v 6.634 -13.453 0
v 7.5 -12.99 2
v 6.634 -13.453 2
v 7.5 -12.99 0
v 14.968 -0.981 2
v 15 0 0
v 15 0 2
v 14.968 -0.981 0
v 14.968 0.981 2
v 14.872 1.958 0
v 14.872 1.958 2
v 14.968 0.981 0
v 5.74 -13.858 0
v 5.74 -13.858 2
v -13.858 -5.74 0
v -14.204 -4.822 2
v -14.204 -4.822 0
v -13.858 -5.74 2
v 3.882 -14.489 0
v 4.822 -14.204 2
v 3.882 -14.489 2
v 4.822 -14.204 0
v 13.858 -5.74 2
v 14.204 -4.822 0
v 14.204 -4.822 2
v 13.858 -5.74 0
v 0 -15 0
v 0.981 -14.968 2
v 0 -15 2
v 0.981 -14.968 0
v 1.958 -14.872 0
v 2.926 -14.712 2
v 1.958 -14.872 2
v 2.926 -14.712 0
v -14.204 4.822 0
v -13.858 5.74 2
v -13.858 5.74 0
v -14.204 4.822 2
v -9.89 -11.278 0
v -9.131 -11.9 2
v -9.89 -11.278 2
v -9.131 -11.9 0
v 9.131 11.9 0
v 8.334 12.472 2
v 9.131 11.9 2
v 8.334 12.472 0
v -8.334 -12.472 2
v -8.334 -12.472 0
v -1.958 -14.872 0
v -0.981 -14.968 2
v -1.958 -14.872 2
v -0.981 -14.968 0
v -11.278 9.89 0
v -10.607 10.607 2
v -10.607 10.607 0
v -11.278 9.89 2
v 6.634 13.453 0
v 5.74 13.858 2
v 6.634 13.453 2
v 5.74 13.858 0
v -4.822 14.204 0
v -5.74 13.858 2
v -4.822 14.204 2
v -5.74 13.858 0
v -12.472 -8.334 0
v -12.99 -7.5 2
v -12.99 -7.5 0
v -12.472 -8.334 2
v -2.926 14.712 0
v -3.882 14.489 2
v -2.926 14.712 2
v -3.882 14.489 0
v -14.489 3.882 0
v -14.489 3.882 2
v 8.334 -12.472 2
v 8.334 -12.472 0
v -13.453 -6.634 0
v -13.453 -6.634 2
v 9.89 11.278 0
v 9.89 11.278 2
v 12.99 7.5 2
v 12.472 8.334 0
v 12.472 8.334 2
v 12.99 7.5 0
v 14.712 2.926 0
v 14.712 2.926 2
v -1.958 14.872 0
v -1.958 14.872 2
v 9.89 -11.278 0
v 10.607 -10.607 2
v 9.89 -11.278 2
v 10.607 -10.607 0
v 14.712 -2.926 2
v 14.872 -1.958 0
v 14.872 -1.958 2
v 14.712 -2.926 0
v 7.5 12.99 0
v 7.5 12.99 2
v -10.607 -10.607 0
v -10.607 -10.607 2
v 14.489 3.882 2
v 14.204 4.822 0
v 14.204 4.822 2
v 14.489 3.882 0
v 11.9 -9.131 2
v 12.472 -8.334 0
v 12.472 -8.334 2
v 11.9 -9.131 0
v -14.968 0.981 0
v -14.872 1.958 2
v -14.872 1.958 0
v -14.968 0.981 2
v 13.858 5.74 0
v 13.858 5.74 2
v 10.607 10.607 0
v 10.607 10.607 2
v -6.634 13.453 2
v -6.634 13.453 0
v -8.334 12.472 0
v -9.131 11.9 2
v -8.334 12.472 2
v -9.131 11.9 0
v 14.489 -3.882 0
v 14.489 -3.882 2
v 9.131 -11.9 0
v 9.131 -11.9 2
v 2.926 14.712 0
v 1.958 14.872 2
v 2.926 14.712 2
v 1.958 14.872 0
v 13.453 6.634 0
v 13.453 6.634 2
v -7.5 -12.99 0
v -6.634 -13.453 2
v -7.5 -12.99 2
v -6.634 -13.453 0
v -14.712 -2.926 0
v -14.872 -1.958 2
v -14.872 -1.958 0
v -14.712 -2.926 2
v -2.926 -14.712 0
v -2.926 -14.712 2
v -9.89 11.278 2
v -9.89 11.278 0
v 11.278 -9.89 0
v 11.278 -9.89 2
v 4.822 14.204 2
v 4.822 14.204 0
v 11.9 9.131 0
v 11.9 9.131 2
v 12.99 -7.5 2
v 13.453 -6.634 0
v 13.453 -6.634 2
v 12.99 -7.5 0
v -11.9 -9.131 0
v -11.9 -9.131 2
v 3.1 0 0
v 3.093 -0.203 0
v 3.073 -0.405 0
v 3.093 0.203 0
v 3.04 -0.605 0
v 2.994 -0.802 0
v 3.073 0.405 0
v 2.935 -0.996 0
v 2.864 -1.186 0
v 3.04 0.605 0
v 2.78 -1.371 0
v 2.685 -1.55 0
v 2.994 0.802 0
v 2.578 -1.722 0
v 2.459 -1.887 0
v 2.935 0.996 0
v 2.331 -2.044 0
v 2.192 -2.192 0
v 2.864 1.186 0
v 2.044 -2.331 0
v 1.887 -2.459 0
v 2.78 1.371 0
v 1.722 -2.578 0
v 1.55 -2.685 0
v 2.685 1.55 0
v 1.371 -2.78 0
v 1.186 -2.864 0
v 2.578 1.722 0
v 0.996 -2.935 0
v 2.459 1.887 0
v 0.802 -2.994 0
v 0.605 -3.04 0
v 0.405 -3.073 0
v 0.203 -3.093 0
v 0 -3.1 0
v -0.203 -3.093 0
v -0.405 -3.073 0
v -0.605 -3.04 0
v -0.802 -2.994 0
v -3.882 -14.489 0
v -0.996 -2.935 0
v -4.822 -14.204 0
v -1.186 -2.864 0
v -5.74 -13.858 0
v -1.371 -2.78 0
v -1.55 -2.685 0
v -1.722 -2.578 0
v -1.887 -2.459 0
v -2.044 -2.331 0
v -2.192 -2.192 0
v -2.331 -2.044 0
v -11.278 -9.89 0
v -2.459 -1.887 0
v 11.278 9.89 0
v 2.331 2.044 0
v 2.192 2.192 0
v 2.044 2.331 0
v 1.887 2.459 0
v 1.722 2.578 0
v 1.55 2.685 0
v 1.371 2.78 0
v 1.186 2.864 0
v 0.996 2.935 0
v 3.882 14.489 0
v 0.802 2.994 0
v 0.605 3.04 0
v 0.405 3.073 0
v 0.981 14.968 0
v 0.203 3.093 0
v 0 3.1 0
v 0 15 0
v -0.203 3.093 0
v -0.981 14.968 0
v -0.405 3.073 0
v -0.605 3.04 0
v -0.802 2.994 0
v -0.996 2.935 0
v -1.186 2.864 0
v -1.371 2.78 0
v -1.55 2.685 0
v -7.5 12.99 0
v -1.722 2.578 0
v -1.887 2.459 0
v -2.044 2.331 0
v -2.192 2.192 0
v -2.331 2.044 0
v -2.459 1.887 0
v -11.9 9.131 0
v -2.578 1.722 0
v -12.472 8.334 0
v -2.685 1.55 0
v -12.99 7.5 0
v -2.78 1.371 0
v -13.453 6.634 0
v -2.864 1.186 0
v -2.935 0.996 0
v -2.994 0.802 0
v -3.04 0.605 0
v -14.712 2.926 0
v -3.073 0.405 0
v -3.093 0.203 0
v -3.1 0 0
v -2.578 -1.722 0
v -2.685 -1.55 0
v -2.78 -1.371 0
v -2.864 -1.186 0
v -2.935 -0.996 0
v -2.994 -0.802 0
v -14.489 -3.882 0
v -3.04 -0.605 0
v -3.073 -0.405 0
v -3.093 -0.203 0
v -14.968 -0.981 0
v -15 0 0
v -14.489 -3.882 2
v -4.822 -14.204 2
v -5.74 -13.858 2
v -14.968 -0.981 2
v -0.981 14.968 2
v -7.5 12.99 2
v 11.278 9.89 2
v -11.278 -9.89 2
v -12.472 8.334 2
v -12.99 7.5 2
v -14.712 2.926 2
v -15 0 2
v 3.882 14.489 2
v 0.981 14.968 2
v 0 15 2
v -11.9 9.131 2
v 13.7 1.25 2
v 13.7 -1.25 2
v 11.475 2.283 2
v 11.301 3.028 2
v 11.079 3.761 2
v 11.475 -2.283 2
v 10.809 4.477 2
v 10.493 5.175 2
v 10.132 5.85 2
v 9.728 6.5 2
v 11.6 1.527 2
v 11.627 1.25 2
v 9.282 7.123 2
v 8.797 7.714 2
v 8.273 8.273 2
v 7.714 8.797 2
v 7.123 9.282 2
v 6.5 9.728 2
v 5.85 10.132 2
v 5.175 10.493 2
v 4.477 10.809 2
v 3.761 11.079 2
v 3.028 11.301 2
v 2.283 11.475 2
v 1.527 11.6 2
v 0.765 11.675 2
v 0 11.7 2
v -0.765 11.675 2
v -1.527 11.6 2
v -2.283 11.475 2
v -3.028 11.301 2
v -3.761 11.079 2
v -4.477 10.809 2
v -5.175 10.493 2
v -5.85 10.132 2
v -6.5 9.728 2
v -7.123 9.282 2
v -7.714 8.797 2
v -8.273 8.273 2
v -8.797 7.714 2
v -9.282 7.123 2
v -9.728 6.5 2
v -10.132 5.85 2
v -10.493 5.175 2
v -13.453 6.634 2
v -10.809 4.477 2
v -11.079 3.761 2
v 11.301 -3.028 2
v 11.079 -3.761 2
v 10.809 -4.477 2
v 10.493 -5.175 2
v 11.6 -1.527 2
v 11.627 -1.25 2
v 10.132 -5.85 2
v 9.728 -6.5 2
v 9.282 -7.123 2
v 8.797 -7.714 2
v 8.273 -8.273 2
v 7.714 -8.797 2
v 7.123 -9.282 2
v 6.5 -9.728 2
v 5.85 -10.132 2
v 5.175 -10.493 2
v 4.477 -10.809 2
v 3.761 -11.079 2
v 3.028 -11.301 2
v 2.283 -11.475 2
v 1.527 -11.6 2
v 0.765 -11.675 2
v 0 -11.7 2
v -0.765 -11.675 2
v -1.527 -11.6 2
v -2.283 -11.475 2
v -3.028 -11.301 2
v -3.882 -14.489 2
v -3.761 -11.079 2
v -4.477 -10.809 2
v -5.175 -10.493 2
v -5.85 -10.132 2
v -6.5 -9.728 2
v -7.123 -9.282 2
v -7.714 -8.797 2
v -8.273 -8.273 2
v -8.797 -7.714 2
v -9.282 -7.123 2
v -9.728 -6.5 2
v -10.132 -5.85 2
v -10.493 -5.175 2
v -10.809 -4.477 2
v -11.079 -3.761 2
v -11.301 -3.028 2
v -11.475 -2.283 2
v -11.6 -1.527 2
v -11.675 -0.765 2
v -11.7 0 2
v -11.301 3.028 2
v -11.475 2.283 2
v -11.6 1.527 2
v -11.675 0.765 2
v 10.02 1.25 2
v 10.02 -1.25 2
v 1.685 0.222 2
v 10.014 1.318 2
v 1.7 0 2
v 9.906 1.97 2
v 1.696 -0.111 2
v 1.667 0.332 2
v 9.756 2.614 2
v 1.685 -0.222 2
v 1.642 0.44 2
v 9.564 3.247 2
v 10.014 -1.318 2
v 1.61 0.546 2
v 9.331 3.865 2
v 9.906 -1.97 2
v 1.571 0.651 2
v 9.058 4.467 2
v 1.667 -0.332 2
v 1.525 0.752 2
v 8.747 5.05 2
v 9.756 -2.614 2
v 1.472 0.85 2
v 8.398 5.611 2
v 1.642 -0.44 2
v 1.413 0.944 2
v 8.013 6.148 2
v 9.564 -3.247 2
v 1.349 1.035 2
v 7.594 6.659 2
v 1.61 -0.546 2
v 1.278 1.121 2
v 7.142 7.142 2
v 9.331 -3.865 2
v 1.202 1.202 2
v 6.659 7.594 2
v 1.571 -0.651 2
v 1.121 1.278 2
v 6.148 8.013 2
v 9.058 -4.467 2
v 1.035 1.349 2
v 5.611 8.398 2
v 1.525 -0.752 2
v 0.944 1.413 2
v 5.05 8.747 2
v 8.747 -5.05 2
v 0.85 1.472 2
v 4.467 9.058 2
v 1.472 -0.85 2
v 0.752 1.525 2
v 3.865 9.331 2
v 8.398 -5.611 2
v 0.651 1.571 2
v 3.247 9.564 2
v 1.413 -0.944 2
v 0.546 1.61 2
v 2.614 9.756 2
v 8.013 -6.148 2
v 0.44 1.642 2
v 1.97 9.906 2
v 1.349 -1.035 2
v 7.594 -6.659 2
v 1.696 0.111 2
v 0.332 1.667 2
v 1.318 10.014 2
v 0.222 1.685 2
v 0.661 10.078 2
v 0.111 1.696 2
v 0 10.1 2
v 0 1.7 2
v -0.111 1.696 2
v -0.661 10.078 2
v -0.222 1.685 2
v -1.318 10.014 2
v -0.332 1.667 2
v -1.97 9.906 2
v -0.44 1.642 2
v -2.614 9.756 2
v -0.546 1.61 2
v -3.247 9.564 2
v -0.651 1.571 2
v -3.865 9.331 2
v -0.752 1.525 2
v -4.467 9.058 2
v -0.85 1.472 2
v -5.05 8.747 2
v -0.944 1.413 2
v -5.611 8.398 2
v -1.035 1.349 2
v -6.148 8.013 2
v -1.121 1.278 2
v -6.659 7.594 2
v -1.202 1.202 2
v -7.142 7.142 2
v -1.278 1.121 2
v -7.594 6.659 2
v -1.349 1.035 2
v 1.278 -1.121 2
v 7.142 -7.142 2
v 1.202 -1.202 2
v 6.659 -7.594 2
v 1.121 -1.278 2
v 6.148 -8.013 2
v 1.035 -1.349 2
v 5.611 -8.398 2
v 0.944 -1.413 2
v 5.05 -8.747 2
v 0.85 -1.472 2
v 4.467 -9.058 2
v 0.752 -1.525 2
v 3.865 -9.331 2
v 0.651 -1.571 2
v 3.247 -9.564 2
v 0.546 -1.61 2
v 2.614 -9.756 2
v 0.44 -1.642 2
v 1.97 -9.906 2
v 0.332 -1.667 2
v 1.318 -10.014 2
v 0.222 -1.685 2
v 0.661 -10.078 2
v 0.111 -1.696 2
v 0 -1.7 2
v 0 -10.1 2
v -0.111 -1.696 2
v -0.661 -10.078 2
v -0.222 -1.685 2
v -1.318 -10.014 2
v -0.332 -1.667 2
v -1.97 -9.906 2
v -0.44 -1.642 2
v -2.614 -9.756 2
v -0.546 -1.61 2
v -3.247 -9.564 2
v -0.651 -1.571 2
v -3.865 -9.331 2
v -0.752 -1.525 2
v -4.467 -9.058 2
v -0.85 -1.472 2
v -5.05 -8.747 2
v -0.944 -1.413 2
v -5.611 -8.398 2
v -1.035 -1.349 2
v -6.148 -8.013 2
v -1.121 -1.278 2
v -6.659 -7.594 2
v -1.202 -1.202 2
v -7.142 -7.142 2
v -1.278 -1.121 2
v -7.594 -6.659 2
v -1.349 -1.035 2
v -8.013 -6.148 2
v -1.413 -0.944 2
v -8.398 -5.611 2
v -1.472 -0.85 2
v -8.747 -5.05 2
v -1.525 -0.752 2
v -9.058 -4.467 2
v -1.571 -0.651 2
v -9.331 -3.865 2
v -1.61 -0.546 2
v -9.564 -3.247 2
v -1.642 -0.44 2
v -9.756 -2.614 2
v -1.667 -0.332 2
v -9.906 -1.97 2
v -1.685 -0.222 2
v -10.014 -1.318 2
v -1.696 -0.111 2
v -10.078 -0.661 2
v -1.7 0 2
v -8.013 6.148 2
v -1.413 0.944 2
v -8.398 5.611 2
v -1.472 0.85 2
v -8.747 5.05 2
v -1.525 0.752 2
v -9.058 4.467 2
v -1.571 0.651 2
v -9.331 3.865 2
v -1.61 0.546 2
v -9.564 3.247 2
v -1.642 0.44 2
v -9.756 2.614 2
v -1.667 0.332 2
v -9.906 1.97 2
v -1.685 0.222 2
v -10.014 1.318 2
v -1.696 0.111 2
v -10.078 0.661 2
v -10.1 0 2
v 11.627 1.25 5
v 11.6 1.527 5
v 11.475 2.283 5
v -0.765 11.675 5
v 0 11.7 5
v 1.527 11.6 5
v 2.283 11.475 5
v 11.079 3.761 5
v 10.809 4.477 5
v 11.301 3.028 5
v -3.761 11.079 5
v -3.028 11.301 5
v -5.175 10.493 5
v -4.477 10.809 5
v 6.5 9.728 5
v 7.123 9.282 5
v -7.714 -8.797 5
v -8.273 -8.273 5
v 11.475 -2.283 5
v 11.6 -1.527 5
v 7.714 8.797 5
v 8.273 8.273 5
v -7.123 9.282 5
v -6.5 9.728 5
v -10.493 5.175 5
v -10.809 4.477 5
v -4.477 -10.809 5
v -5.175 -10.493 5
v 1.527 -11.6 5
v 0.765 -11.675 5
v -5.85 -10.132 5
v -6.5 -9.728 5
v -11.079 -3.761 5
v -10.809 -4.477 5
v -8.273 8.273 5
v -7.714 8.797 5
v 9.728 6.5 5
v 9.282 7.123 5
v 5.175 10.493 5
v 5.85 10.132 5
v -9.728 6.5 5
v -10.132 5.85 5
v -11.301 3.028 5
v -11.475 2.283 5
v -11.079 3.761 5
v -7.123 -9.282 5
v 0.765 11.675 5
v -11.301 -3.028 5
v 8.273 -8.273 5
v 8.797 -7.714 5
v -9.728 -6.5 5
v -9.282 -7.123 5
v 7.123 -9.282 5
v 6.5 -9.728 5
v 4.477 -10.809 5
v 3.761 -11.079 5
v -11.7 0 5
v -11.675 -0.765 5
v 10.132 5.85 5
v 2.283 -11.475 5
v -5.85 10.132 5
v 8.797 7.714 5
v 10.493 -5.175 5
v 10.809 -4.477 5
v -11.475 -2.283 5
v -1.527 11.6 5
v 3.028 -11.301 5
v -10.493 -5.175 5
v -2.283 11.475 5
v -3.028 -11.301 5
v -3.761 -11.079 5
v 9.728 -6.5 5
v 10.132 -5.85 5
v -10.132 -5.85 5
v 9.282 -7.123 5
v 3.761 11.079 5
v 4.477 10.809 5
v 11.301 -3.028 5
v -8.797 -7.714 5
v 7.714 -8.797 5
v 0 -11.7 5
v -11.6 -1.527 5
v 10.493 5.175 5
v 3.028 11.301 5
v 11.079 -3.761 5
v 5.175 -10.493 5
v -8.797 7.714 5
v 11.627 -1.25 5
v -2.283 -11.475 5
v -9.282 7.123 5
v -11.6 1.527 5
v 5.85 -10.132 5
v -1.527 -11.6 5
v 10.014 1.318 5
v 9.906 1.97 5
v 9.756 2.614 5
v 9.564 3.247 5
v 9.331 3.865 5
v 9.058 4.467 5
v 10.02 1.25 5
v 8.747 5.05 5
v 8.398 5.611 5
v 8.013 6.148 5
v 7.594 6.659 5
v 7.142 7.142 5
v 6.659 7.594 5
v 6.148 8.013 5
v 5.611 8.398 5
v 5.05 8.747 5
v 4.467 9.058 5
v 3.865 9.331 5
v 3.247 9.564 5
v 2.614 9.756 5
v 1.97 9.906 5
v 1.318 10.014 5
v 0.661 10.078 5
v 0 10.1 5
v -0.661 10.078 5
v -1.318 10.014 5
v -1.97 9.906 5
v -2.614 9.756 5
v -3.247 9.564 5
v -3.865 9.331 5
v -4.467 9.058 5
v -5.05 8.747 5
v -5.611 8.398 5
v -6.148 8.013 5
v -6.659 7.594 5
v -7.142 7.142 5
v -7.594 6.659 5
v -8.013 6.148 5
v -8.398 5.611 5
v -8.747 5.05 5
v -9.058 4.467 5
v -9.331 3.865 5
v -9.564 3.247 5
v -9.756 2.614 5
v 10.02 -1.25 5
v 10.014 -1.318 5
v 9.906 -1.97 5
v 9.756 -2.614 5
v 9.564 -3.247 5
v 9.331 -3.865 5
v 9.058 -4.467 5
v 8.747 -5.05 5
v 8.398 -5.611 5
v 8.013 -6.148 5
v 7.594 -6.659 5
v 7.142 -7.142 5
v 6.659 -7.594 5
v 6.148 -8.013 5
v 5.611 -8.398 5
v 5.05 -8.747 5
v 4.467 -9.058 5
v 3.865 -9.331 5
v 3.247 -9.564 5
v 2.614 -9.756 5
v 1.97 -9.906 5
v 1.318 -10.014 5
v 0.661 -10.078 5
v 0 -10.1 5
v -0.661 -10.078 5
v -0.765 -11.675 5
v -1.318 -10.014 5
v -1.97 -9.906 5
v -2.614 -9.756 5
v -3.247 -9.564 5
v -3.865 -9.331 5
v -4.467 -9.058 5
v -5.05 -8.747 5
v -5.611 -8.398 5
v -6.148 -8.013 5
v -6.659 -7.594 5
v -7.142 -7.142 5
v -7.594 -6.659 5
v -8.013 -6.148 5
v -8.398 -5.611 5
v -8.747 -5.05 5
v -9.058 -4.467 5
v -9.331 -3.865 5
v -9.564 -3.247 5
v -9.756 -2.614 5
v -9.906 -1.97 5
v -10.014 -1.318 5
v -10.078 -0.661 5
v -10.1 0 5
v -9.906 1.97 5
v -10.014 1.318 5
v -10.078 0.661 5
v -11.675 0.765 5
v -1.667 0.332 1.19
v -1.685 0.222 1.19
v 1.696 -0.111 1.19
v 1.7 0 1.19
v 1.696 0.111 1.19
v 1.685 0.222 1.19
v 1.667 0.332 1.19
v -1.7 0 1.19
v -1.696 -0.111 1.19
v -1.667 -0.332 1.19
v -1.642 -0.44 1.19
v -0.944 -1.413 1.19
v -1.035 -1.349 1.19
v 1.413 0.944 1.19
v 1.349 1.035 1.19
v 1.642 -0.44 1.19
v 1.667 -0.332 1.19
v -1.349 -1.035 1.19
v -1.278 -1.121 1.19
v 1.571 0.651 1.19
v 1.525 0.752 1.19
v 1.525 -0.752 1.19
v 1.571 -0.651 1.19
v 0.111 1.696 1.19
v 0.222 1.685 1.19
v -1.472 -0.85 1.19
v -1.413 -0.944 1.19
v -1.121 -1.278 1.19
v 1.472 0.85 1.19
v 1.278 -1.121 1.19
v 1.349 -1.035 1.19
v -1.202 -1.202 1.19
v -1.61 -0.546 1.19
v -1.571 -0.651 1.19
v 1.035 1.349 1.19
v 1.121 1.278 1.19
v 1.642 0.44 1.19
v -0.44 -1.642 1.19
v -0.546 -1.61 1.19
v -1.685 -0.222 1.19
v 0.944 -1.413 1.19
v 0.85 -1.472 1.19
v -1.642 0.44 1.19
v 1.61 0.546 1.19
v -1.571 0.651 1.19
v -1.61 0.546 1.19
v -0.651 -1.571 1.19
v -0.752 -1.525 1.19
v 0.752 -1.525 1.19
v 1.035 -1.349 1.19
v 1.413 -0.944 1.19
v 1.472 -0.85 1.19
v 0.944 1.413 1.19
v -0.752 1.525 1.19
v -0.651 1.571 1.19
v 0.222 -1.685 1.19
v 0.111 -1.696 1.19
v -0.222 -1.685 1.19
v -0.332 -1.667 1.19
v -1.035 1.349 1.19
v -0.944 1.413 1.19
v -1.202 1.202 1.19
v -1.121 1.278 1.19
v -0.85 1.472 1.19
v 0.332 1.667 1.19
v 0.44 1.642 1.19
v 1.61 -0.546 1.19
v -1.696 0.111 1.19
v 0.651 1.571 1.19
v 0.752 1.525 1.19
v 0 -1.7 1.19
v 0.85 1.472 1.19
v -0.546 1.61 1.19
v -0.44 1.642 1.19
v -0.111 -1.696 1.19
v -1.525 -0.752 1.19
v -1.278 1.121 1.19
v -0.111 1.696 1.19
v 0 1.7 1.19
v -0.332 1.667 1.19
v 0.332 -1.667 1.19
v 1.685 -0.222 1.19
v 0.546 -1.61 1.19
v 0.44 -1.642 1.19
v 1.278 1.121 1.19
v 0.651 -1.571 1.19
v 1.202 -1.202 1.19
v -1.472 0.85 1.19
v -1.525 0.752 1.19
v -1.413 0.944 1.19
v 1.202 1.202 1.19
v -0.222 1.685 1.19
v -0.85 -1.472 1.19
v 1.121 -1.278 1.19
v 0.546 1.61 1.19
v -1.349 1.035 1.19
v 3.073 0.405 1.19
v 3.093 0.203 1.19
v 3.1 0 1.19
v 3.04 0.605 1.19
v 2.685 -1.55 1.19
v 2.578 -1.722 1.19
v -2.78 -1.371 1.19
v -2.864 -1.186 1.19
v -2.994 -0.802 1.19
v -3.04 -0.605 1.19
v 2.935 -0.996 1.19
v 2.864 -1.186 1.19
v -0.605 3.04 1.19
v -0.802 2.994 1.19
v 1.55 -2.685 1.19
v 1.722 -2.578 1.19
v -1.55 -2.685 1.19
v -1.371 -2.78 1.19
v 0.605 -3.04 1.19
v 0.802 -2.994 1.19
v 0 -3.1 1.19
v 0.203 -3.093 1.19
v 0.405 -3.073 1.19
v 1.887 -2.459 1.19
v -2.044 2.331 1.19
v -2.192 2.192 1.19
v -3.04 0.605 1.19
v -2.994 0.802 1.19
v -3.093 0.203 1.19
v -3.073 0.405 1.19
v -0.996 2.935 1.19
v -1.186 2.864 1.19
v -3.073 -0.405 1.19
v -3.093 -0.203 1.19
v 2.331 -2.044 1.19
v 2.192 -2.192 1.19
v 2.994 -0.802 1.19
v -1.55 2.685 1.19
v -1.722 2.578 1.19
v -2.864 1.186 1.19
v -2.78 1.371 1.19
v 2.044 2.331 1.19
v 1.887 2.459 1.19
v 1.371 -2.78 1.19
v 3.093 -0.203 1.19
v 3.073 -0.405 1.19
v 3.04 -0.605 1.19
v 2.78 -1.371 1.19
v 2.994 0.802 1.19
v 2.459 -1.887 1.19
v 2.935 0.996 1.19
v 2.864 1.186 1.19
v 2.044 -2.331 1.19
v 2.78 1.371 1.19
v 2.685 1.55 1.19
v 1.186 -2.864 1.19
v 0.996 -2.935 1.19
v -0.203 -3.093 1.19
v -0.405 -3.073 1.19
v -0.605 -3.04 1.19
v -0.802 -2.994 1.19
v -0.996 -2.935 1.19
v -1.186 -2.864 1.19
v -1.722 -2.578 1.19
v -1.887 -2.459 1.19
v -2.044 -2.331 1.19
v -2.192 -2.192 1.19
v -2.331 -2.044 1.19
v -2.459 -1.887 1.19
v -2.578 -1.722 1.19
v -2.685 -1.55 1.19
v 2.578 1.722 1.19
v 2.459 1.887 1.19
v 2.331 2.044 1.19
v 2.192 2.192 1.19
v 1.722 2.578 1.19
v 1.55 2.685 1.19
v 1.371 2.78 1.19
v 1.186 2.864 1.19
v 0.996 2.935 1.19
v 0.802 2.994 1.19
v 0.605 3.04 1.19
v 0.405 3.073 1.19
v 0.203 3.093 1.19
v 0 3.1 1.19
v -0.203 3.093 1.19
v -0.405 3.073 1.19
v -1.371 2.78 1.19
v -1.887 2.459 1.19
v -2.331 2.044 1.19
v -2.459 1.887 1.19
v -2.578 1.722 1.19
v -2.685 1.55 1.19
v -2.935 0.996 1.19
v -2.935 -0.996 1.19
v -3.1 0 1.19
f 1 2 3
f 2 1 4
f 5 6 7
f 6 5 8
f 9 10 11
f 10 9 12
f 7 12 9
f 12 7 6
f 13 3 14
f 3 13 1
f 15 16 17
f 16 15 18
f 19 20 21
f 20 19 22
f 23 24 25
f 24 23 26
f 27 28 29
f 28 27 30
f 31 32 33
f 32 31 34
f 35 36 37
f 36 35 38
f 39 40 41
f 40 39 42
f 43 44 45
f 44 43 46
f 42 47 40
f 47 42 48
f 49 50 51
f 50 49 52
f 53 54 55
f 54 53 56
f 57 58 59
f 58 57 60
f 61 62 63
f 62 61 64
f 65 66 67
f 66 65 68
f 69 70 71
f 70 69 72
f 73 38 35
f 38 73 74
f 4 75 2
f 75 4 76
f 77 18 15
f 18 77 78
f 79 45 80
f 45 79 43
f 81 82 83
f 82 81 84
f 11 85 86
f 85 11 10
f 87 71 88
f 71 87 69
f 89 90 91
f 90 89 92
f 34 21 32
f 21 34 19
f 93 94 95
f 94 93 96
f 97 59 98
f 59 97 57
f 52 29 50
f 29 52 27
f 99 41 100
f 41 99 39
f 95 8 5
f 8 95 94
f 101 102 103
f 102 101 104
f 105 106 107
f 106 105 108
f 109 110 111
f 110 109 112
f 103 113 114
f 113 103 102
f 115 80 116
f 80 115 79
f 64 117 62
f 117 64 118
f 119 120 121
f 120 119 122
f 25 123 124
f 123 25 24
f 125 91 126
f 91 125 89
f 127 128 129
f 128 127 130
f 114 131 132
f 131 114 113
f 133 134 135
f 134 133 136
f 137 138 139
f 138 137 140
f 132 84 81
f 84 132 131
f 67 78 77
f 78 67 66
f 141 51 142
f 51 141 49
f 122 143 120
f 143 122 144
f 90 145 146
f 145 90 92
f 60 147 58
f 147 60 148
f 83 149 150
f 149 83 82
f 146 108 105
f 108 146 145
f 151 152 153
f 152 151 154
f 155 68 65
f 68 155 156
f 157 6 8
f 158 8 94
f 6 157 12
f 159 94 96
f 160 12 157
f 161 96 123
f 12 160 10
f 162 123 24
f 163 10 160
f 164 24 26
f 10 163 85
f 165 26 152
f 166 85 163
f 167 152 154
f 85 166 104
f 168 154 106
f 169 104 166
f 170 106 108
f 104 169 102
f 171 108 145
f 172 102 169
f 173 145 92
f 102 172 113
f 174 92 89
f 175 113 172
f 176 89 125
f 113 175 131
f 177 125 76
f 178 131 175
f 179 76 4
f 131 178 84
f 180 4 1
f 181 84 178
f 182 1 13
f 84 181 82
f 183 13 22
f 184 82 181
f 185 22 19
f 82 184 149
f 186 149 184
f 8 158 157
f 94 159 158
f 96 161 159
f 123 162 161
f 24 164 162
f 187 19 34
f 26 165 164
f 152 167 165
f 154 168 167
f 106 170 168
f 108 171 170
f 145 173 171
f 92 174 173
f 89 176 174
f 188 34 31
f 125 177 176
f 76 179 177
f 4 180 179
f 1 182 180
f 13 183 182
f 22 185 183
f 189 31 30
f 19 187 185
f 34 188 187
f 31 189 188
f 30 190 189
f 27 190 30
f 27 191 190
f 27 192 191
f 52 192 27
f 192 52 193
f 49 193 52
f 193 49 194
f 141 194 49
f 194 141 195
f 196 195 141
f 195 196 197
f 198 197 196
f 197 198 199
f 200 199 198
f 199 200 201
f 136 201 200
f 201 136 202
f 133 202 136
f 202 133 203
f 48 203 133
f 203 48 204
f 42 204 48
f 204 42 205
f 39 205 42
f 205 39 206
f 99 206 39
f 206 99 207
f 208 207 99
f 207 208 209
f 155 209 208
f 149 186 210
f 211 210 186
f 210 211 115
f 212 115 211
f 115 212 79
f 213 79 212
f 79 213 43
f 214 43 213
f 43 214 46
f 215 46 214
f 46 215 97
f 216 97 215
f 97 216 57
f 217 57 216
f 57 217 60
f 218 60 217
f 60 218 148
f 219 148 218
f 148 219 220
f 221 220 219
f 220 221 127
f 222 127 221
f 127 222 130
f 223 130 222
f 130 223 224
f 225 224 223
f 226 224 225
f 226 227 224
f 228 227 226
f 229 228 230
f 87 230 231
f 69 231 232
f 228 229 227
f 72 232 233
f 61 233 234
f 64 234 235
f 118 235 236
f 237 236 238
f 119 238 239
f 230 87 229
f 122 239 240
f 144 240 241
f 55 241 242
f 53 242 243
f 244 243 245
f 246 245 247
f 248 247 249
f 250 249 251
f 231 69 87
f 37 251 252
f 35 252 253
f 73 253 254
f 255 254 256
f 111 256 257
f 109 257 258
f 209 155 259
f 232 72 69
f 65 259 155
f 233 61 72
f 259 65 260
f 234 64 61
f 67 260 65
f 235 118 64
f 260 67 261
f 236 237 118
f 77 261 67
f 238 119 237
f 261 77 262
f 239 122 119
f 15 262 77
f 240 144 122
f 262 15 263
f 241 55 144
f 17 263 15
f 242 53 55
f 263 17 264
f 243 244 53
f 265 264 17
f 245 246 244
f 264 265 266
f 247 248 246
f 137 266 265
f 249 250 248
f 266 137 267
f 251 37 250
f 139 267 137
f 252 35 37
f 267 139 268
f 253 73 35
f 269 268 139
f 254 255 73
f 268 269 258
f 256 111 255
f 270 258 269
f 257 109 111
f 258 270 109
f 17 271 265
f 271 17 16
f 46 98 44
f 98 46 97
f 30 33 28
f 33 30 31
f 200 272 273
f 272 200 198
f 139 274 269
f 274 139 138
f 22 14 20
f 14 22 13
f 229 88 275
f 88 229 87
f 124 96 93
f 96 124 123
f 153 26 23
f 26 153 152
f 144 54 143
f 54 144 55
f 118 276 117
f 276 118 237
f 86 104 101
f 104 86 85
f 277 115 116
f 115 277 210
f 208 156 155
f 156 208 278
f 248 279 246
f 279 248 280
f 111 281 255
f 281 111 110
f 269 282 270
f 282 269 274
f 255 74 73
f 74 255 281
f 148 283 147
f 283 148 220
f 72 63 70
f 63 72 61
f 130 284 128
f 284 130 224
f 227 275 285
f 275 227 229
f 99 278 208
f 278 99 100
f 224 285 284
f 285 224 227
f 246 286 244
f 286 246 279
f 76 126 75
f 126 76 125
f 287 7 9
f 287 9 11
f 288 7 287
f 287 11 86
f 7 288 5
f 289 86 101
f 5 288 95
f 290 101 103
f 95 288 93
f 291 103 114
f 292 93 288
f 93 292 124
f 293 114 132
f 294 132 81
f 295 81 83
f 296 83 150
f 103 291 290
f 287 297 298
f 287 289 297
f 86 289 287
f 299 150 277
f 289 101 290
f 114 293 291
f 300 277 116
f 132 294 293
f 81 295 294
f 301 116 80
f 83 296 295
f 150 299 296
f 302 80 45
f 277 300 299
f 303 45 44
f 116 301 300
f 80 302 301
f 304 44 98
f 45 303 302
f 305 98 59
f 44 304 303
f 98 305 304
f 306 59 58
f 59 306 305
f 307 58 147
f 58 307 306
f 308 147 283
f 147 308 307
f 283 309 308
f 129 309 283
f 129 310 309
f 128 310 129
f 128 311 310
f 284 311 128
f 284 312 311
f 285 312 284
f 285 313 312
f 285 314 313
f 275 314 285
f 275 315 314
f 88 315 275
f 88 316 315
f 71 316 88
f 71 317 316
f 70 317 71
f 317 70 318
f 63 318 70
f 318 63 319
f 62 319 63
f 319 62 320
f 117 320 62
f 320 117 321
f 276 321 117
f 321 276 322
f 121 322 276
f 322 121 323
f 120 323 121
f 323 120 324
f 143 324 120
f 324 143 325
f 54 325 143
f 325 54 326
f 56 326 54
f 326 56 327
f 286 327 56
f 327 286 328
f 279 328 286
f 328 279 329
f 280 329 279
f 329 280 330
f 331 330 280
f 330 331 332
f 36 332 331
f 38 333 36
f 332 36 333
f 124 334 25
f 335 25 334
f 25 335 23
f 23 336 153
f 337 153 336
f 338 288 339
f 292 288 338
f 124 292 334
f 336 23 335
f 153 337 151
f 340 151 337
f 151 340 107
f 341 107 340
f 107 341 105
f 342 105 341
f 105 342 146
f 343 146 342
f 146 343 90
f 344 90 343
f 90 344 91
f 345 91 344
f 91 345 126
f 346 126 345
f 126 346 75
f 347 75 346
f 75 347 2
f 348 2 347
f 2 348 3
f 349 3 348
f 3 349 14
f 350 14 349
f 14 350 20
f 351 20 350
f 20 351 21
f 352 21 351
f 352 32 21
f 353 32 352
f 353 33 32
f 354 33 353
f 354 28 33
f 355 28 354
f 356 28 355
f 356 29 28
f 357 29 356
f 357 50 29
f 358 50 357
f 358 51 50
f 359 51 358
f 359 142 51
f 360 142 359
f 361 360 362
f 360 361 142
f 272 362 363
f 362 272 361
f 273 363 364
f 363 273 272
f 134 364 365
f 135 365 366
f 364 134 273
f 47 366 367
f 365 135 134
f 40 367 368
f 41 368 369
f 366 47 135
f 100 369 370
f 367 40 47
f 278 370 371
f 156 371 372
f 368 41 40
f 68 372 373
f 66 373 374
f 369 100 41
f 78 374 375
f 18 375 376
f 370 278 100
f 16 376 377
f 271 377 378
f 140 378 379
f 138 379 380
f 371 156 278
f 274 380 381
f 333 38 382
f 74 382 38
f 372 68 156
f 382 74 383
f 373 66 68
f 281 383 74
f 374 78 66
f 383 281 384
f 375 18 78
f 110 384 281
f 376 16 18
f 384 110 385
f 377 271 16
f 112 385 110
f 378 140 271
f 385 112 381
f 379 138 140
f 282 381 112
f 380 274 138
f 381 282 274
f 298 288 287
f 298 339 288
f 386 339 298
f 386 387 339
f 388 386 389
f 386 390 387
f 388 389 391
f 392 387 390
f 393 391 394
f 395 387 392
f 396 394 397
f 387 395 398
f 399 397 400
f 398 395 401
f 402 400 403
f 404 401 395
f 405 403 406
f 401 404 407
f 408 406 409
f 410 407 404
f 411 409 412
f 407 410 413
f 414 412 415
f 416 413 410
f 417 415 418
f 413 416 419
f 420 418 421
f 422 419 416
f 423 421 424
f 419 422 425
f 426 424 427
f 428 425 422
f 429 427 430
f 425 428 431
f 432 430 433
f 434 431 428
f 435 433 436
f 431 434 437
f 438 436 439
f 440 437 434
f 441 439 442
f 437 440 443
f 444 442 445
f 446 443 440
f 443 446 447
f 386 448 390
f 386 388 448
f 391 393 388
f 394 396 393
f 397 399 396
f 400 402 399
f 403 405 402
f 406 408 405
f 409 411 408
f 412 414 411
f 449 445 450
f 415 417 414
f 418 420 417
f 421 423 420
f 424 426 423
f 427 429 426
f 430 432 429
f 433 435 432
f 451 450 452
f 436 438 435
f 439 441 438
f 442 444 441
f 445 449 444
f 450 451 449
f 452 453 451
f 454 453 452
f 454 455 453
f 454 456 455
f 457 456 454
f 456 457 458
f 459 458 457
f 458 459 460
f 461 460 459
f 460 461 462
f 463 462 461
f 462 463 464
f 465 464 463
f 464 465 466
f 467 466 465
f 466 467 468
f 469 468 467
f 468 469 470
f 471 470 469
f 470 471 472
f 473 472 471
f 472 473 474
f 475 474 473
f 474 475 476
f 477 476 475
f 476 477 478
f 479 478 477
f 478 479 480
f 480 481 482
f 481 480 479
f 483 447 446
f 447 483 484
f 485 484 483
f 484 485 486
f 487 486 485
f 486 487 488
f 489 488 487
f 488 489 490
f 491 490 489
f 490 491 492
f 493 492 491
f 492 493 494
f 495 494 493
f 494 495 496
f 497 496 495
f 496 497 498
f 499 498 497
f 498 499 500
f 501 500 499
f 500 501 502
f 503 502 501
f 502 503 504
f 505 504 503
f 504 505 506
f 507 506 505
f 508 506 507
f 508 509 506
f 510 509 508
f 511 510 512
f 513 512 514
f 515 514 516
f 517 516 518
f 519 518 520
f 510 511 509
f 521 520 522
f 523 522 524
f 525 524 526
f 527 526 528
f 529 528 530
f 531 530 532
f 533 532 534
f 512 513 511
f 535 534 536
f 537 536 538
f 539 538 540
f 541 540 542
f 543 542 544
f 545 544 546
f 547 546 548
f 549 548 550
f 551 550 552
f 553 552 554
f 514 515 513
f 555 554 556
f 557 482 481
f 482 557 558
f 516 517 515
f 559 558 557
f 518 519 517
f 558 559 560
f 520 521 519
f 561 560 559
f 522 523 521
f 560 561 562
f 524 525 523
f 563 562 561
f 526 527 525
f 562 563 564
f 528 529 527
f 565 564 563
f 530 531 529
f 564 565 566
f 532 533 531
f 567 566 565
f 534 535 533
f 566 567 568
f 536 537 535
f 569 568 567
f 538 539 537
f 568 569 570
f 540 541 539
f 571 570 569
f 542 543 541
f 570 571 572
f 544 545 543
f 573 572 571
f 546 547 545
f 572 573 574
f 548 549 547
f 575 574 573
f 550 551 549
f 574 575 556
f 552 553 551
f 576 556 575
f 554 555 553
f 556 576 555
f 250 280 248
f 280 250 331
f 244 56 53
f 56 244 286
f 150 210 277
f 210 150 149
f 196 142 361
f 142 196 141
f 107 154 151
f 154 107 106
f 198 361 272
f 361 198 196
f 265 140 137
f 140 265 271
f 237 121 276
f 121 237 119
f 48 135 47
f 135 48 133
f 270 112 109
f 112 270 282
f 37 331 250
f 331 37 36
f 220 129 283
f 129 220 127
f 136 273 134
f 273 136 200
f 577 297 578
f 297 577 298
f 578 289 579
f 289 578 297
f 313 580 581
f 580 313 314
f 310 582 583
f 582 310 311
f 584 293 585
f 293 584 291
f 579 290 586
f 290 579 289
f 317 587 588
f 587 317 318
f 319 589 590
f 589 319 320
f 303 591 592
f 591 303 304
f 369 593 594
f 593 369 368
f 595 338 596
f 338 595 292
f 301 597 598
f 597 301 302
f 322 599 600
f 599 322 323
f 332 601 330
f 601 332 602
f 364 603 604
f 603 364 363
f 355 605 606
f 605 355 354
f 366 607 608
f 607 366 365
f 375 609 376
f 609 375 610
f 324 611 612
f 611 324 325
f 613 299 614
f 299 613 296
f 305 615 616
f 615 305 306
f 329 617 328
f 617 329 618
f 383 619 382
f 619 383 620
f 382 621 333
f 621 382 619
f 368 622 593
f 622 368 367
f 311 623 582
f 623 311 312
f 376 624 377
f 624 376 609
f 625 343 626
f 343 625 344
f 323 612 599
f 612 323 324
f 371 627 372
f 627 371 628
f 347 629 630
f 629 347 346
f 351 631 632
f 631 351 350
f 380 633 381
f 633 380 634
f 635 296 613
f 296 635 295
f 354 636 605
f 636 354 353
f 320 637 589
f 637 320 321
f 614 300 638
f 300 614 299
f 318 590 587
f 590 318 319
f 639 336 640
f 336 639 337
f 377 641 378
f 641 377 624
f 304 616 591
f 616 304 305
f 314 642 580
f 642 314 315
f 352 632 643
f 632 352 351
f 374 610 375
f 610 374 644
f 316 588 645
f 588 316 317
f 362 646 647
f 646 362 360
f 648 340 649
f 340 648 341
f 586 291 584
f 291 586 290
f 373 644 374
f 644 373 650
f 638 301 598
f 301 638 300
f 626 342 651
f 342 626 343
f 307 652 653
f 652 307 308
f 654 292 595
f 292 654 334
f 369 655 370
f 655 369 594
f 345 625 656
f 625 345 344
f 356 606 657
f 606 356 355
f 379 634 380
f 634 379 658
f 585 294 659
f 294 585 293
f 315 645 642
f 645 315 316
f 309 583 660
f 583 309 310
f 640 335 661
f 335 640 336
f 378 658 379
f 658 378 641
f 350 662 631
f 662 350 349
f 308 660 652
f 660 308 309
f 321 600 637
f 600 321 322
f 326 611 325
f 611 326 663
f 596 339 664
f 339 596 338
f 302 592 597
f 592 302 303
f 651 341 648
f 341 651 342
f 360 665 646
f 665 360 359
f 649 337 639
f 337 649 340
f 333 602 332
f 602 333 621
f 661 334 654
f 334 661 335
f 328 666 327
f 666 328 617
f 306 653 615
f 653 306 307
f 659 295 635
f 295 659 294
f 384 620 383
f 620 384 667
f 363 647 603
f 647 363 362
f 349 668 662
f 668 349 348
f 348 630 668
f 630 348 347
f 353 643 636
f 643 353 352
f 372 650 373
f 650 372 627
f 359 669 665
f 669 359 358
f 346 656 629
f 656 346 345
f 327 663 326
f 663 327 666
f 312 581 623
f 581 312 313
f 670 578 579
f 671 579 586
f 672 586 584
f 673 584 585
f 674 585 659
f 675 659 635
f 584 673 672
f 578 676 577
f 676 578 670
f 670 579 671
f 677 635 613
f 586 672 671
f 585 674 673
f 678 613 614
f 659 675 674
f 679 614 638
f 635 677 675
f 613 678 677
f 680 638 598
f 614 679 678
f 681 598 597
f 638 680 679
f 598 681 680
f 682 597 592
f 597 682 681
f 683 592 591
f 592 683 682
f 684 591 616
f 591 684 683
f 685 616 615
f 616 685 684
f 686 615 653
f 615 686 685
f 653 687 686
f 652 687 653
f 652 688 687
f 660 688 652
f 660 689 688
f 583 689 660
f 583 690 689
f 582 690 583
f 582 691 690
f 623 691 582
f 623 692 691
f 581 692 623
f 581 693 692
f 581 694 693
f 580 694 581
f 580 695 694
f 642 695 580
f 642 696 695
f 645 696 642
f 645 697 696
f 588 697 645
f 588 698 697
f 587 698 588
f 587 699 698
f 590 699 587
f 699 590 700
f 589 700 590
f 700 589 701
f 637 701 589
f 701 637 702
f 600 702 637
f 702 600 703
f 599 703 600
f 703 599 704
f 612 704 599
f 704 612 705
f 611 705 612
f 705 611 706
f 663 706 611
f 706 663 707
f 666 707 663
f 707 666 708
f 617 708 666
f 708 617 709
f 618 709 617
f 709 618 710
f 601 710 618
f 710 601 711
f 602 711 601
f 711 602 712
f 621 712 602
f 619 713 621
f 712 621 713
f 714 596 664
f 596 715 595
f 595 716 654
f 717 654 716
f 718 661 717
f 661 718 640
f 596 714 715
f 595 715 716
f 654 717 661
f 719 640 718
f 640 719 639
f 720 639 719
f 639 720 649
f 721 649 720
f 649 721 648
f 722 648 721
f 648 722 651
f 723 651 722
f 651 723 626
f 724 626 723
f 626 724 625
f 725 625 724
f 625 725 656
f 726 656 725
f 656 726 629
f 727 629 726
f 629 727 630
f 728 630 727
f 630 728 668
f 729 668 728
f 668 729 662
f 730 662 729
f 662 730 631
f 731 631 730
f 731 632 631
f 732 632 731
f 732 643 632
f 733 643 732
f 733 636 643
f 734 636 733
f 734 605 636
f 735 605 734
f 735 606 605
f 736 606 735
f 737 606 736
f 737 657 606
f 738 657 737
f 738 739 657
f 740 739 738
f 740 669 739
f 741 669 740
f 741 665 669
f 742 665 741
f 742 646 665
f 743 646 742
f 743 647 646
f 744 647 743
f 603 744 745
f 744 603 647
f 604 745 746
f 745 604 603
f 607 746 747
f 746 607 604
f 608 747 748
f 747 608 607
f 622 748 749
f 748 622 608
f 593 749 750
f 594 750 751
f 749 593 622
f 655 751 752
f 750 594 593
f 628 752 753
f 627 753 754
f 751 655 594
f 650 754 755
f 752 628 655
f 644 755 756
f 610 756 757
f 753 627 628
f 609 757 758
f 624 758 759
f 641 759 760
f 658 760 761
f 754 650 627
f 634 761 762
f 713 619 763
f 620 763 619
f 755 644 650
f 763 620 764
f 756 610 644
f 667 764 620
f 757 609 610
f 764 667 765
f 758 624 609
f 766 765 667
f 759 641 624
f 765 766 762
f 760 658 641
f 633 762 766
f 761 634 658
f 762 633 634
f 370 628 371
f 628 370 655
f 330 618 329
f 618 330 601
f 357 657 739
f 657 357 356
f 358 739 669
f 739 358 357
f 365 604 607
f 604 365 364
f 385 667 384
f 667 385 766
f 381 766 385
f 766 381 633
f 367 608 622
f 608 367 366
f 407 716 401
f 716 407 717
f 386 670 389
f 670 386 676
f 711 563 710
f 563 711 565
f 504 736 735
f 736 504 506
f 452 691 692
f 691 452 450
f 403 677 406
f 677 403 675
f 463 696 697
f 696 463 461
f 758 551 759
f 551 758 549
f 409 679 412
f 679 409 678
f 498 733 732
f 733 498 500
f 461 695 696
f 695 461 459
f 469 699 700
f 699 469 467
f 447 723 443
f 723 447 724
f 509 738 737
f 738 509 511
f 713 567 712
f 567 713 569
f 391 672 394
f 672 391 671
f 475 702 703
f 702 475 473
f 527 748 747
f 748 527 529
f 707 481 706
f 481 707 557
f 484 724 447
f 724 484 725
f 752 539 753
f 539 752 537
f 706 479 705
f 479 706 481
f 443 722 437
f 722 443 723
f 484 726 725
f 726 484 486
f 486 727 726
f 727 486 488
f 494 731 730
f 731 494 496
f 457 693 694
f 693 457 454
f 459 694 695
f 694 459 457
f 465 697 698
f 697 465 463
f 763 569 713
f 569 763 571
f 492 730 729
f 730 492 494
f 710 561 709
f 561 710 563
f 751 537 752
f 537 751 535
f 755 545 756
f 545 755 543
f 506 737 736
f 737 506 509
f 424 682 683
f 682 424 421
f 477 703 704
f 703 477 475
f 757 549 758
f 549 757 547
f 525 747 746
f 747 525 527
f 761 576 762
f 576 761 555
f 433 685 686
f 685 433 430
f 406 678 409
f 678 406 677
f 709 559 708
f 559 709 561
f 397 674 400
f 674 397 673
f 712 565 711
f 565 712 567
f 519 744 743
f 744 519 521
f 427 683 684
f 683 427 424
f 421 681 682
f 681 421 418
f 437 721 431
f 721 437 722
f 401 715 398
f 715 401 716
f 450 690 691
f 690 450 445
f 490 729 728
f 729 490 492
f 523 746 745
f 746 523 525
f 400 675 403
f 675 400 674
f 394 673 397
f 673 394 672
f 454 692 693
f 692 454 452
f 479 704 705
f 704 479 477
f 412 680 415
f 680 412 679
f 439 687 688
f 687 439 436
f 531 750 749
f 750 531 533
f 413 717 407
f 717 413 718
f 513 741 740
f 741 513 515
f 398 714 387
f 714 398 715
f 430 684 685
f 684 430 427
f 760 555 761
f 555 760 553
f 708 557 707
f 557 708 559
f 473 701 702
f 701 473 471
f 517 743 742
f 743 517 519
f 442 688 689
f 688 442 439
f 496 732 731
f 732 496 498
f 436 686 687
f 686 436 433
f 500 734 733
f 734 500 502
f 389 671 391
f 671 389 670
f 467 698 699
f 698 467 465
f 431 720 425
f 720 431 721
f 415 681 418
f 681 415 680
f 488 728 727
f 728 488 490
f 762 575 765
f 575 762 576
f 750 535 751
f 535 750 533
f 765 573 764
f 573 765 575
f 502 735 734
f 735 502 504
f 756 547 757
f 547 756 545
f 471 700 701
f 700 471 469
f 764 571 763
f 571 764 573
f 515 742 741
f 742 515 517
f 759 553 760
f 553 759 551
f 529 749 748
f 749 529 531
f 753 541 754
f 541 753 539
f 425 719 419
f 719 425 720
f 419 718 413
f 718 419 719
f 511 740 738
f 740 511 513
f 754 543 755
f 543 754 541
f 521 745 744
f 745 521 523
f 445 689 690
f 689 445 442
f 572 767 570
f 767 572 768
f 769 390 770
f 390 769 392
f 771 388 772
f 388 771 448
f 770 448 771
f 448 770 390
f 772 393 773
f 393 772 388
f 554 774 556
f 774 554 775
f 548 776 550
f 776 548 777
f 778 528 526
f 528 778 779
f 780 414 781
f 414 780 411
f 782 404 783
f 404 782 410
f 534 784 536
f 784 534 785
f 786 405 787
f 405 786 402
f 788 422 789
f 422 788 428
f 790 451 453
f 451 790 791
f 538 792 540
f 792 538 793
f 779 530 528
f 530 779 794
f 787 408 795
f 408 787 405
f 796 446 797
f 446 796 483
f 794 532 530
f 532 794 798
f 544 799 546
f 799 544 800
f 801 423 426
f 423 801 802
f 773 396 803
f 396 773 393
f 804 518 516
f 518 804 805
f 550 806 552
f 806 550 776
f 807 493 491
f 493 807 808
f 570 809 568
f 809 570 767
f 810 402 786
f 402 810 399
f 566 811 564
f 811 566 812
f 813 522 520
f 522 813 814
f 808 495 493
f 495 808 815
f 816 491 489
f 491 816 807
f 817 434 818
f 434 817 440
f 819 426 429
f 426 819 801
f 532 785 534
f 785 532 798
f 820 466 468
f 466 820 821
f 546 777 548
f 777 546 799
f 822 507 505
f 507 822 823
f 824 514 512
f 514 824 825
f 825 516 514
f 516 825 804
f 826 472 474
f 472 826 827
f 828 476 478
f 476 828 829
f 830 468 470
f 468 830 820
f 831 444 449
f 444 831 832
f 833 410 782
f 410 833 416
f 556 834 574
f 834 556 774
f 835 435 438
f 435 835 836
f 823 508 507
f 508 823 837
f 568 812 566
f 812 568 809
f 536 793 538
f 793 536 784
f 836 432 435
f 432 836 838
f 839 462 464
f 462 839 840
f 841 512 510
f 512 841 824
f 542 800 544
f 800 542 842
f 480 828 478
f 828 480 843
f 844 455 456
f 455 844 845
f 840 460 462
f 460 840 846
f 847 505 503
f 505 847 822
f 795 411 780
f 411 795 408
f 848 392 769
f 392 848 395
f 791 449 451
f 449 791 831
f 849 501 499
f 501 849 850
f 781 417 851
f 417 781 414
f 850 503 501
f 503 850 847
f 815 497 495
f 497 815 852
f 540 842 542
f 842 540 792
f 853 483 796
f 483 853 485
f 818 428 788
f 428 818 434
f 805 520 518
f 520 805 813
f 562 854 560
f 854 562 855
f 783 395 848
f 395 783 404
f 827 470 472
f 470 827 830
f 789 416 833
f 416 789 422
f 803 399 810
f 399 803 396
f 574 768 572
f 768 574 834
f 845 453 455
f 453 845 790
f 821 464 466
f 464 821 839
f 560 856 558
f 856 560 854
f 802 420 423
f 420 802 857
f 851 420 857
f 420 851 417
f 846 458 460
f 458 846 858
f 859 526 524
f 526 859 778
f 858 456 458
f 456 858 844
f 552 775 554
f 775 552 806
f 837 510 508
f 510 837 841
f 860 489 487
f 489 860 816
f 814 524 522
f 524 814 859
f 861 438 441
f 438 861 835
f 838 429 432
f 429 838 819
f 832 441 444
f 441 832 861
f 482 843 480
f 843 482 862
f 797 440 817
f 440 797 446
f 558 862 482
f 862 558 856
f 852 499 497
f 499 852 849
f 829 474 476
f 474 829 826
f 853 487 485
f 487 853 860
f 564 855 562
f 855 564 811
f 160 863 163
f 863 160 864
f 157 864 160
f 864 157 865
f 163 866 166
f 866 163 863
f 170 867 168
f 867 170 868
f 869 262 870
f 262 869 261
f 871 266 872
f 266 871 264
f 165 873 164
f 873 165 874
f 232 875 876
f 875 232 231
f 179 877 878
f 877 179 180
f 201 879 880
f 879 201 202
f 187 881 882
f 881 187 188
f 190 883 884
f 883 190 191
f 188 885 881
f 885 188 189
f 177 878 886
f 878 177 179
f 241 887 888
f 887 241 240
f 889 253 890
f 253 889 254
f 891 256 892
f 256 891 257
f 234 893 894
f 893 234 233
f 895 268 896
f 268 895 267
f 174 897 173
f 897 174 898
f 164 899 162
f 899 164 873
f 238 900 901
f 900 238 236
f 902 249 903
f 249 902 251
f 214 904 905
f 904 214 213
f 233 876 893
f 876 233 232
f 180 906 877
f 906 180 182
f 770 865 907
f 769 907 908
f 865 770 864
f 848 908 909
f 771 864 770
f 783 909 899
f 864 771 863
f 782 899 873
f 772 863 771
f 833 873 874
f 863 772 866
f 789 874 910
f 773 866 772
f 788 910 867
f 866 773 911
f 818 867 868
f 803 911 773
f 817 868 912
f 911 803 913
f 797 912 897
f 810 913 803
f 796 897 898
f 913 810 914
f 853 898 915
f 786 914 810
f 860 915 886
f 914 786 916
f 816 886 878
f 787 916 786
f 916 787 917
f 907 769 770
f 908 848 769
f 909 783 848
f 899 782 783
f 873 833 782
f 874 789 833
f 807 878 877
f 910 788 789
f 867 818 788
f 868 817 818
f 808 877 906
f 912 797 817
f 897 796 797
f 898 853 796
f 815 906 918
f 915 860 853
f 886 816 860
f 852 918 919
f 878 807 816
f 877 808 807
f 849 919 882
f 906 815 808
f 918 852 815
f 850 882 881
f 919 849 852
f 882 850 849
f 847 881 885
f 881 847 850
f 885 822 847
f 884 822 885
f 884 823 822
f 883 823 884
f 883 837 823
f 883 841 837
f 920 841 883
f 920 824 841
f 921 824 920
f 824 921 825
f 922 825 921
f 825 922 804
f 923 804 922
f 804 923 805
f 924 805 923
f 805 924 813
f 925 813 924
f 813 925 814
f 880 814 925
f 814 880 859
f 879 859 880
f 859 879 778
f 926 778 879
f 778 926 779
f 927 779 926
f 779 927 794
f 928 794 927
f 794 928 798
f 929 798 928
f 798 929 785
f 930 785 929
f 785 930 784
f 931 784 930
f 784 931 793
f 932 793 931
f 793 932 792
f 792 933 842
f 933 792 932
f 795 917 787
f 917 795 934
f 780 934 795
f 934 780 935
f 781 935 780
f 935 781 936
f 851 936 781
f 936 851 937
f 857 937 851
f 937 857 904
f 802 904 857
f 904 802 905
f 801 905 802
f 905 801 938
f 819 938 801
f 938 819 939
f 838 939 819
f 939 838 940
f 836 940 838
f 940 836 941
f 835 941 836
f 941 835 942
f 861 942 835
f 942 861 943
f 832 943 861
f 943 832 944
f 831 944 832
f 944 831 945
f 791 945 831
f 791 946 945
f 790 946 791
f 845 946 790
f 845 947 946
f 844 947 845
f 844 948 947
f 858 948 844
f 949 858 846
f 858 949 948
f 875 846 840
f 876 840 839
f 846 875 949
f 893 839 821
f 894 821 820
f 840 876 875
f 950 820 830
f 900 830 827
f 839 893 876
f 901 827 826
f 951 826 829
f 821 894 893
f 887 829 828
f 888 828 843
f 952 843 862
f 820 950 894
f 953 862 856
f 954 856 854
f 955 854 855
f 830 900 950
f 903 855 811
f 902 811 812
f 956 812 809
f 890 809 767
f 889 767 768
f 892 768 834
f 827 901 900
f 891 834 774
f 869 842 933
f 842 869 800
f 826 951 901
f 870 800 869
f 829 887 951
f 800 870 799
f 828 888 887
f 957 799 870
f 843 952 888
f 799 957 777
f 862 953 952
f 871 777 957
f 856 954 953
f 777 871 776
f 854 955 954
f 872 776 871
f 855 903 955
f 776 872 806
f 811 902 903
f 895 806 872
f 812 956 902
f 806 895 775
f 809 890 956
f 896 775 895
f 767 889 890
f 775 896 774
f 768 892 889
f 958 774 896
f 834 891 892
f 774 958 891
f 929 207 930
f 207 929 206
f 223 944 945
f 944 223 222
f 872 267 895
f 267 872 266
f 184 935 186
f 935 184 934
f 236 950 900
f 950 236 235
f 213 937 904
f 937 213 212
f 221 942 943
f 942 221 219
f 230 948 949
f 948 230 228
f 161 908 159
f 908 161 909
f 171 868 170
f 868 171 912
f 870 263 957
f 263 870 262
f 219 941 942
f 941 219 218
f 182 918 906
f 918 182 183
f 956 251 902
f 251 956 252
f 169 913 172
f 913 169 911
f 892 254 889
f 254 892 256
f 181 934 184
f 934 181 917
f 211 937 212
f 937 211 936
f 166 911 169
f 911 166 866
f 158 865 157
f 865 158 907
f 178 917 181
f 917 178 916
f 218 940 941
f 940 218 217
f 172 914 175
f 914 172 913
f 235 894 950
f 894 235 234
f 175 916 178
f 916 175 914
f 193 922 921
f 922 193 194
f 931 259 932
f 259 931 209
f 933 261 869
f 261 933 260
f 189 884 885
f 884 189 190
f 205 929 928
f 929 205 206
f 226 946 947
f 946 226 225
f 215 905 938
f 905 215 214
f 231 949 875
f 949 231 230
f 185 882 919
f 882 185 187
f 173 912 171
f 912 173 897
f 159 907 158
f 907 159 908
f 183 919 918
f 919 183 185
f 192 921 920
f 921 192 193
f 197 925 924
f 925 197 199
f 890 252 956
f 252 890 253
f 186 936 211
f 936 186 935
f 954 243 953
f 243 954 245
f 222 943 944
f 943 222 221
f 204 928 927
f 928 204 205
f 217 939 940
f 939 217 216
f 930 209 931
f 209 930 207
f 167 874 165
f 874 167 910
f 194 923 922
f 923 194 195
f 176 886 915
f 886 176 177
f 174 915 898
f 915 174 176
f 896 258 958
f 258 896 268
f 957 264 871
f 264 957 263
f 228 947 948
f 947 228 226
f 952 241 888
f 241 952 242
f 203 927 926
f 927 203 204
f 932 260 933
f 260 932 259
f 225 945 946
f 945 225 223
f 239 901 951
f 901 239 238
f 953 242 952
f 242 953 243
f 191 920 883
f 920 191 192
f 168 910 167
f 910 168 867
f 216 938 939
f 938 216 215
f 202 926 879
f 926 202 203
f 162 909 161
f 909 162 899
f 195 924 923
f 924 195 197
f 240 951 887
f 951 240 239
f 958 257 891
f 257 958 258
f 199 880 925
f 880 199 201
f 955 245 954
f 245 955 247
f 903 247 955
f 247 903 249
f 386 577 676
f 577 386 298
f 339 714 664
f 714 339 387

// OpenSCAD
// Coil clip for the 19 x 12 mm levitation coils (M3 ferrite core).
// The coil sits face-down in a cup; a nylon M3 screw goes through the base
// into the core. The flat back takes a Velcro (hook) dot for the headband.
// Print in PETG/PLA, 0.2 mm layers, no supports (cup opening facing up).

coil_d      = 19.0;   // coil outer diameter
coil_h      = 12.0;   // coil height
clearance   = 0.6;    // radial clearance
wall        = 1.6;
base        = 2.0;    // base thickness (adds to coil-to-scalp distance)
lip         = 3.0;    // how far the cup wraps the coil side
screw_d     = 3.4;    // M3 clearance
head_d      = 6.2;    // M3 head counterbore
head_h      = 1.2;
lead_slot_w = 2.5;    // slot for the winding leads
pad_d       = 30.0;   // Velcro pad diameter

$fn = 96;

difference() {
  union() {
    // Velcro pad
    cylinder(d = pad_d, h = base);
    // Cup
    cylinder(d = coil_d + 2 * (clearance + wall), h = base + lip);
  }
  // Coil pocket
  translate([0, 0, base]) cylinder(d = coil_d + 2 * clearance, h = coil_h);
  // Screw hole + counterbore on the pad side
  translate([0, 0, -1]) cylinder(d = screw_d, h = base + 2);
  translate([0, 0, -0.01]) cylinder(d = head_d, h = head_h);
  // Lead slot through the cup wall
  translate([coil_d / 2 - 1, -lead_slot_w / 2, base]) cube([wall + clearance + 3, lead_slot_w, lip + 1]);
}
